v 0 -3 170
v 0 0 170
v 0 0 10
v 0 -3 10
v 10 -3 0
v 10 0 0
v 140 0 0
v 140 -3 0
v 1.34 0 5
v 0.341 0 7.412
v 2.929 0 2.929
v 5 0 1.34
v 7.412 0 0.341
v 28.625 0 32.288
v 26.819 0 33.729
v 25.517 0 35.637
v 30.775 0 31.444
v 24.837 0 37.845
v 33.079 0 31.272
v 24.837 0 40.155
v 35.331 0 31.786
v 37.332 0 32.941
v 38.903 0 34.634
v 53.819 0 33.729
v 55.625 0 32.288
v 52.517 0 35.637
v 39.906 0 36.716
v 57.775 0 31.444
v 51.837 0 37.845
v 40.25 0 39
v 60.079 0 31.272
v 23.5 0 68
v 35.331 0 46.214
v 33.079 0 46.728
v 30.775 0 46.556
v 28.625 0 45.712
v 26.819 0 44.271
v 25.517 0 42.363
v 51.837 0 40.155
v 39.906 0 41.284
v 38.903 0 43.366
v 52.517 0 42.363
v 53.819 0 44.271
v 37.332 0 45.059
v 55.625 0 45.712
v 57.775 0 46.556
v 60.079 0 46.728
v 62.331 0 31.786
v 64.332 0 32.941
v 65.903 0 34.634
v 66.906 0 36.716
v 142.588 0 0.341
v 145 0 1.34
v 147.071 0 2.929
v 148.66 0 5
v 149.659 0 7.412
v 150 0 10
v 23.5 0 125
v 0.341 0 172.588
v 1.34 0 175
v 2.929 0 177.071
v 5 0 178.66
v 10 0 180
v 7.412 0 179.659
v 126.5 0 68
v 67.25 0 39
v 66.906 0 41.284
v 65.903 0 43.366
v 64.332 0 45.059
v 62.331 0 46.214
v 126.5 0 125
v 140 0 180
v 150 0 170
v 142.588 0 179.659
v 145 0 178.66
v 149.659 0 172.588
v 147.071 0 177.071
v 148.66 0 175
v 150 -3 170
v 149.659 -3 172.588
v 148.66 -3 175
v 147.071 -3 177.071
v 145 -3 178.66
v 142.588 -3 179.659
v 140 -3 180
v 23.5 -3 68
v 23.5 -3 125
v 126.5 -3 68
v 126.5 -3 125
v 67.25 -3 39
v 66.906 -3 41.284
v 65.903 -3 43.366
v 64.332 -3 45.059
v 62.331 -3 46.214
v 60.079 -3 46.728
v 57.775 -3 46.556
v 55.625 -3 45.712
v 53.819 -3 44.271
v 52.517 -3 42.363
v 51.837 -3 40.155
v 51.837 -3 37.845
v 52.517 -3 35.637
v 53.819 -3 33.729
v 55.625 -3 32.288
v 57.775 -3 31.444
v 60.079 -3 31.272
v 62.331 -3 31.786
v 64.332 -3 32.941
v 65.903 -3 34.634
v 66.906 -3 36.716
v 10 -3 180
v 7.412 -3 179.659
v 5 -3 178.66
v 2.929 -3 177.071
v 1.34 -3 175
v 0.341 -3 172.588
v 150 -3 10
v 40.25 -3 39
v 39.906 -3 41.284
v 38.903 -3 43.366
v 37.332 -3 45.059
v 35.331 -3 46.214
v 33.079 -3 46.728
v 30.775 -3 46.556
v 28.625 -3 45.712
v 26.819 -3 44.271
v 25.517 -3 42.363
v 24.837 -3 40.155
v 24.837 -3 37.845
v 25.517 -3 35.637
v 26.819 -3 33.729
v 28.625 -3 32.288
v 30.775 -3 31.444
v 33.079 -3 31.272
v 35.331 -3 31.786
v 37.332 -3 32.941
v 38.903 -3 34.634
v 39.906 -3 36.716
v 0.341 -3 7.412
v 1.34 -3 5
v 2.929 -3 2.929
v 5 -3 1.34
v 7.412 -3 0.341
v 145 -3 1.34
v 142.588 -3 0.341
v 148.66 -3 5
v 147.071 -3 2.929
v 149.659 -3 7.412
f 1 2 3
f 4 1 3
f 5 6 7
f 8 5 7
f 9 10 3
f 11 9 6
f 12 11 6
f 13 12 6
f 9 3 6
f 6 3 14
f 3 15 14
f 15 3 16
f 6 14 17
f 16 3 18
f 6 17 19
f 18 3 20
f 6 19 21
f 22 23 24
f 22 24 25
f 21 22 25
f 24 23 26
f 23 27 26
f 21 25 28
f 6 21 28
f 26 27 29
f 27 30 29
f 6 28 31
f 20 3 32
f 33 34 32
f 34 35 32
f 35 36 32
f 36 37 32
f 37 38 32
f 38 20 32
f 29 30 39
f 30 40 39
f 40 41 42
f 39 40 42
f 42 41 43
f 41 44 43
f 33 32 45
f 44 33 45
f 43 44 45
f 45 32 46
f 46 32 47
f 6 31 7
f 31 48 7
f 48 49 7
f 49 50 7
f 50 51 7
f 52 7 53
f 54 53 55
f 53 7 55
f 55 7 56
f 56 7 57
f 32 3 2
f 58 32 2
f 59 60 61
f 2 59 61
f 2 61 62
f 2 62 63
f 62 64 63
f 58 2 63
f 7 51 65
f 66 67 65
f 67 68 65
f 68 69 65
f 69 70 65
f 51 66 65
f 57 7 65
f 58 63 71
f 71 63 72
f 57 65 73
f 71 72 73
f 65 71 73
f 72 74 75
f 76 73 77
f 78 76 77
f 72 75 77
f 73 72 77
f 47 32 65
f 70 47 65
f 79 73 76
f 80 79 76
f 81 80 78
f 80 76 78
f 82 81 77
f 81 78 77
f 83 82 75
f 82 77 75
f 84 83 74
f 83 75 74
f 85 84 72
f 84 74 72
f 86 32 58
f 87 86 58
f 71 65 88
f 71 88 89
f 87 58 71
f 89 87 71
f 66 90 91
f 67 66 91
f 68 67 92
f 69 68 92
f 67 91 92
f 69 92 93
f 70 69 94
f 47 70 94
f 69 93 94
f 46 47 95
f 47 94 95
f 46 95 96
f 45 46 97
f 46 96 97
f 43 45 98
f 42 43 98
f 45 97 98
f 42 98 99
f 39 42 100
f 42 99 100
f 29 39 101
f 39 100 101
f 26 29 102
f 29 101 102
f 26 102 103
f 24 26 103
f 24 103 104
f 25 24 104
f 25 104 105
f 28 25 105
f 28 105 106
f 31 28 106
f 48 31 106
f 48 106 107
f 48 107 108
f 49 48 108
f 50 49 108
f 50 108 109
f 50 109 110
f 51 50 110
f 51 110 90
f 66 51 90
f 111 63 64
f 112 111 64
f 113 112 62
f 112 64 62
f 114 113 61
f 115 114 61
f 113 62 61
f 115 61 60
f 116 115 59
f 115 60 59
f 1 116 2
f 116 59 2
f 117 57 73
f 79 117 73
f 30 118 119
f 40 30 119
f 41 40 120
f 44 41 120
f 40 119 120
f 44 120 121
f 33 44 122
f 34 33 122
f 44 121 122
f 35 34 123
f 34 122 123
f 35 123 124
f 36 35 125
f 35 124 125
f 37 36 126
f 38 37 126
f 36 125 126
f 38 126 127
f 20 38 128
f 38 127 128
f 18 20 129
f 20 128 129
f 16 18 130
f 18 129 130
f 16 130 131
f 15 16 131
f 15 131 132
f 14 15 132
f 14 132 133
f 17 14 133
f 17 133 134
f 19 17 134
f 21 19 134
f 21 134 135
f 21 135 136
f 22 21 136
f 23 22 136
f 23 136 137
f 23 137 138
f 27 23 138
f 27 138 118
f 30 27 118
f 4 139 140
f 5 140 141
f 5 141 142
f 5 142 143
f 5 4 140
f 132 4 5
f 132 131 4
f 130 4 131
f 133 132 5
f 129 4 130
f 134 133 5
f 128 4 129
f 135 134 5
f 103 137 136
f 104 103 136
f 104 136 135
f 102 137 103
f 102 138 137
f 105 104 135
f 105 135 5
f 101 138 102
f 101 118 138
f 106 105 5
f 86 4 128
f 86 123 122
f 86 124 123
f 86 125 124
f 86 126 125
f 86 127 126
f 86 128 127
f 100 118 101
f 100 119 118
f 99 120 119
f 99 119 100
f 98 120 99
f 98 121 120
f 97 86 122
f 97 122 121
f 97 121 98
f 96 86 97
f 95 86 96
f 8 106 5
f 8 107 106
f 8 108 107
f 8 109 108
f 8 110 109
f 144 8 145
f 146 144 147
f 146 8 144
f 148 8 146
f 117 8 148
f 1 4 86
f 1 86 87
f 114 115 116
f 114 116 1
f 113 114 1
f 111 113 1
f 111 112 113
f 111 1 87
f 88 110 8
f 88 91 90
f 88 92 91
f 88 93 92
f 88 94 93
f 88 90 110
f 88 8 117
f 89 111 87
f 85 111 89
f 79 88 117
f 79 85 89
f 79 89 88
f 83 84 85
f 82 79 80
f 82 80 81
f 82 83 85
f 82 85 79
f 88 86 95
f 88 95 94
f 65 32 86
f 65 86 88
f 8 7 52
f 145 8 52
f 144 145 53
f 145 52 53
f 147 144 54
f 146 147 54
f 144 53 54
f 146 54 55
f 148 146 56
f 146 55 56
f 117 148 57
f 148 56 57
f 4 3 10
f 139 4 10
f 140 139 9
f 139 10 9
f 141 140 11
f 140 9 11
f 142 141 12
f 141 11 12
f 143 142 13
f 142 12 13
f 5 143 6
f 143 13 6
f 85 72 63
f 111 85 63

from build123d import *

# Parameters (mm, degrees)
F1_DEPTH = 3
F2_W     = 103
F2_H     = 57
F3_DEPTH = 3.001
F4_R     = 7.75
F5_DEPTH = 25


with BuildPart() as f1:
    # F0 (on Front) → F1 (new body)
    with BuildSketch(Plane.XZ):
        with BuildLine():
            ThreePointArc((0, 10), (2.928932, 2.928932), (10, 0))
            Line((10, 0), (140, 0))
            ThreePointArc((140, 0), (147.071068, 2.928932), (150, 10))
            Line((150, 10), (150, 170))
            ThreePointArc((150, 170), (147.071068, 177.071068), (140, 180))
            Line((140, 180), (10, 180))
            ThreePointArc((10, 180), (2.928932, 177.071068), (0, 170))
            Line((0, 170), (0, 10))
        make_face()
    extrude(amount=F1_DEPTH)

    # F2 (on face) + F1_face (on face) → F3 (cut, through all)
    with BuildSketch(Plane.XZ):
        with Locations((75, 96.5)):
            Rectangle(F2_W, F2_H)
    with BuildSketch(Plane(origin=(75, -3, 90), x_dir=(1, 0, 0), z_dir=(0, -1, 0))):
        with BuildLine():
            Line((-75, 80), (-75, -80))
            ThreePointArc((-75, -80), (-72.071068, -87.071068), (-65, -90))
            Line((-65, -90), (65, -90))
            ThreePointArc((65, -90), (72.071068, -87.071068), (75, -80))
            Line((75, -80), (75, 80))
            ThreePointArc((75, 80), (72.071068, 87.071068), (65, 90))
            Line((65, 90), (-65, 90))
            ThreePointArc((-65, 90), (-72.071068, 87.071068), (-75, 80))
        make_face()
    extrude(amount=F3_DEPTH, mode=Mode.SUBTRACT)

    # F4 (on face) → F5 (cut)
    with BuildSketch(Plane.XZ.offset(3)):
        with Locations((32.5, 39)):
            Circle(F4_R)
        with Locations((59.5, 39)):
            Circle(F4_R)
    extrude(amount=-F5_DEPTH, mode=Mode.SUBTRACT)


solid = f1.part
